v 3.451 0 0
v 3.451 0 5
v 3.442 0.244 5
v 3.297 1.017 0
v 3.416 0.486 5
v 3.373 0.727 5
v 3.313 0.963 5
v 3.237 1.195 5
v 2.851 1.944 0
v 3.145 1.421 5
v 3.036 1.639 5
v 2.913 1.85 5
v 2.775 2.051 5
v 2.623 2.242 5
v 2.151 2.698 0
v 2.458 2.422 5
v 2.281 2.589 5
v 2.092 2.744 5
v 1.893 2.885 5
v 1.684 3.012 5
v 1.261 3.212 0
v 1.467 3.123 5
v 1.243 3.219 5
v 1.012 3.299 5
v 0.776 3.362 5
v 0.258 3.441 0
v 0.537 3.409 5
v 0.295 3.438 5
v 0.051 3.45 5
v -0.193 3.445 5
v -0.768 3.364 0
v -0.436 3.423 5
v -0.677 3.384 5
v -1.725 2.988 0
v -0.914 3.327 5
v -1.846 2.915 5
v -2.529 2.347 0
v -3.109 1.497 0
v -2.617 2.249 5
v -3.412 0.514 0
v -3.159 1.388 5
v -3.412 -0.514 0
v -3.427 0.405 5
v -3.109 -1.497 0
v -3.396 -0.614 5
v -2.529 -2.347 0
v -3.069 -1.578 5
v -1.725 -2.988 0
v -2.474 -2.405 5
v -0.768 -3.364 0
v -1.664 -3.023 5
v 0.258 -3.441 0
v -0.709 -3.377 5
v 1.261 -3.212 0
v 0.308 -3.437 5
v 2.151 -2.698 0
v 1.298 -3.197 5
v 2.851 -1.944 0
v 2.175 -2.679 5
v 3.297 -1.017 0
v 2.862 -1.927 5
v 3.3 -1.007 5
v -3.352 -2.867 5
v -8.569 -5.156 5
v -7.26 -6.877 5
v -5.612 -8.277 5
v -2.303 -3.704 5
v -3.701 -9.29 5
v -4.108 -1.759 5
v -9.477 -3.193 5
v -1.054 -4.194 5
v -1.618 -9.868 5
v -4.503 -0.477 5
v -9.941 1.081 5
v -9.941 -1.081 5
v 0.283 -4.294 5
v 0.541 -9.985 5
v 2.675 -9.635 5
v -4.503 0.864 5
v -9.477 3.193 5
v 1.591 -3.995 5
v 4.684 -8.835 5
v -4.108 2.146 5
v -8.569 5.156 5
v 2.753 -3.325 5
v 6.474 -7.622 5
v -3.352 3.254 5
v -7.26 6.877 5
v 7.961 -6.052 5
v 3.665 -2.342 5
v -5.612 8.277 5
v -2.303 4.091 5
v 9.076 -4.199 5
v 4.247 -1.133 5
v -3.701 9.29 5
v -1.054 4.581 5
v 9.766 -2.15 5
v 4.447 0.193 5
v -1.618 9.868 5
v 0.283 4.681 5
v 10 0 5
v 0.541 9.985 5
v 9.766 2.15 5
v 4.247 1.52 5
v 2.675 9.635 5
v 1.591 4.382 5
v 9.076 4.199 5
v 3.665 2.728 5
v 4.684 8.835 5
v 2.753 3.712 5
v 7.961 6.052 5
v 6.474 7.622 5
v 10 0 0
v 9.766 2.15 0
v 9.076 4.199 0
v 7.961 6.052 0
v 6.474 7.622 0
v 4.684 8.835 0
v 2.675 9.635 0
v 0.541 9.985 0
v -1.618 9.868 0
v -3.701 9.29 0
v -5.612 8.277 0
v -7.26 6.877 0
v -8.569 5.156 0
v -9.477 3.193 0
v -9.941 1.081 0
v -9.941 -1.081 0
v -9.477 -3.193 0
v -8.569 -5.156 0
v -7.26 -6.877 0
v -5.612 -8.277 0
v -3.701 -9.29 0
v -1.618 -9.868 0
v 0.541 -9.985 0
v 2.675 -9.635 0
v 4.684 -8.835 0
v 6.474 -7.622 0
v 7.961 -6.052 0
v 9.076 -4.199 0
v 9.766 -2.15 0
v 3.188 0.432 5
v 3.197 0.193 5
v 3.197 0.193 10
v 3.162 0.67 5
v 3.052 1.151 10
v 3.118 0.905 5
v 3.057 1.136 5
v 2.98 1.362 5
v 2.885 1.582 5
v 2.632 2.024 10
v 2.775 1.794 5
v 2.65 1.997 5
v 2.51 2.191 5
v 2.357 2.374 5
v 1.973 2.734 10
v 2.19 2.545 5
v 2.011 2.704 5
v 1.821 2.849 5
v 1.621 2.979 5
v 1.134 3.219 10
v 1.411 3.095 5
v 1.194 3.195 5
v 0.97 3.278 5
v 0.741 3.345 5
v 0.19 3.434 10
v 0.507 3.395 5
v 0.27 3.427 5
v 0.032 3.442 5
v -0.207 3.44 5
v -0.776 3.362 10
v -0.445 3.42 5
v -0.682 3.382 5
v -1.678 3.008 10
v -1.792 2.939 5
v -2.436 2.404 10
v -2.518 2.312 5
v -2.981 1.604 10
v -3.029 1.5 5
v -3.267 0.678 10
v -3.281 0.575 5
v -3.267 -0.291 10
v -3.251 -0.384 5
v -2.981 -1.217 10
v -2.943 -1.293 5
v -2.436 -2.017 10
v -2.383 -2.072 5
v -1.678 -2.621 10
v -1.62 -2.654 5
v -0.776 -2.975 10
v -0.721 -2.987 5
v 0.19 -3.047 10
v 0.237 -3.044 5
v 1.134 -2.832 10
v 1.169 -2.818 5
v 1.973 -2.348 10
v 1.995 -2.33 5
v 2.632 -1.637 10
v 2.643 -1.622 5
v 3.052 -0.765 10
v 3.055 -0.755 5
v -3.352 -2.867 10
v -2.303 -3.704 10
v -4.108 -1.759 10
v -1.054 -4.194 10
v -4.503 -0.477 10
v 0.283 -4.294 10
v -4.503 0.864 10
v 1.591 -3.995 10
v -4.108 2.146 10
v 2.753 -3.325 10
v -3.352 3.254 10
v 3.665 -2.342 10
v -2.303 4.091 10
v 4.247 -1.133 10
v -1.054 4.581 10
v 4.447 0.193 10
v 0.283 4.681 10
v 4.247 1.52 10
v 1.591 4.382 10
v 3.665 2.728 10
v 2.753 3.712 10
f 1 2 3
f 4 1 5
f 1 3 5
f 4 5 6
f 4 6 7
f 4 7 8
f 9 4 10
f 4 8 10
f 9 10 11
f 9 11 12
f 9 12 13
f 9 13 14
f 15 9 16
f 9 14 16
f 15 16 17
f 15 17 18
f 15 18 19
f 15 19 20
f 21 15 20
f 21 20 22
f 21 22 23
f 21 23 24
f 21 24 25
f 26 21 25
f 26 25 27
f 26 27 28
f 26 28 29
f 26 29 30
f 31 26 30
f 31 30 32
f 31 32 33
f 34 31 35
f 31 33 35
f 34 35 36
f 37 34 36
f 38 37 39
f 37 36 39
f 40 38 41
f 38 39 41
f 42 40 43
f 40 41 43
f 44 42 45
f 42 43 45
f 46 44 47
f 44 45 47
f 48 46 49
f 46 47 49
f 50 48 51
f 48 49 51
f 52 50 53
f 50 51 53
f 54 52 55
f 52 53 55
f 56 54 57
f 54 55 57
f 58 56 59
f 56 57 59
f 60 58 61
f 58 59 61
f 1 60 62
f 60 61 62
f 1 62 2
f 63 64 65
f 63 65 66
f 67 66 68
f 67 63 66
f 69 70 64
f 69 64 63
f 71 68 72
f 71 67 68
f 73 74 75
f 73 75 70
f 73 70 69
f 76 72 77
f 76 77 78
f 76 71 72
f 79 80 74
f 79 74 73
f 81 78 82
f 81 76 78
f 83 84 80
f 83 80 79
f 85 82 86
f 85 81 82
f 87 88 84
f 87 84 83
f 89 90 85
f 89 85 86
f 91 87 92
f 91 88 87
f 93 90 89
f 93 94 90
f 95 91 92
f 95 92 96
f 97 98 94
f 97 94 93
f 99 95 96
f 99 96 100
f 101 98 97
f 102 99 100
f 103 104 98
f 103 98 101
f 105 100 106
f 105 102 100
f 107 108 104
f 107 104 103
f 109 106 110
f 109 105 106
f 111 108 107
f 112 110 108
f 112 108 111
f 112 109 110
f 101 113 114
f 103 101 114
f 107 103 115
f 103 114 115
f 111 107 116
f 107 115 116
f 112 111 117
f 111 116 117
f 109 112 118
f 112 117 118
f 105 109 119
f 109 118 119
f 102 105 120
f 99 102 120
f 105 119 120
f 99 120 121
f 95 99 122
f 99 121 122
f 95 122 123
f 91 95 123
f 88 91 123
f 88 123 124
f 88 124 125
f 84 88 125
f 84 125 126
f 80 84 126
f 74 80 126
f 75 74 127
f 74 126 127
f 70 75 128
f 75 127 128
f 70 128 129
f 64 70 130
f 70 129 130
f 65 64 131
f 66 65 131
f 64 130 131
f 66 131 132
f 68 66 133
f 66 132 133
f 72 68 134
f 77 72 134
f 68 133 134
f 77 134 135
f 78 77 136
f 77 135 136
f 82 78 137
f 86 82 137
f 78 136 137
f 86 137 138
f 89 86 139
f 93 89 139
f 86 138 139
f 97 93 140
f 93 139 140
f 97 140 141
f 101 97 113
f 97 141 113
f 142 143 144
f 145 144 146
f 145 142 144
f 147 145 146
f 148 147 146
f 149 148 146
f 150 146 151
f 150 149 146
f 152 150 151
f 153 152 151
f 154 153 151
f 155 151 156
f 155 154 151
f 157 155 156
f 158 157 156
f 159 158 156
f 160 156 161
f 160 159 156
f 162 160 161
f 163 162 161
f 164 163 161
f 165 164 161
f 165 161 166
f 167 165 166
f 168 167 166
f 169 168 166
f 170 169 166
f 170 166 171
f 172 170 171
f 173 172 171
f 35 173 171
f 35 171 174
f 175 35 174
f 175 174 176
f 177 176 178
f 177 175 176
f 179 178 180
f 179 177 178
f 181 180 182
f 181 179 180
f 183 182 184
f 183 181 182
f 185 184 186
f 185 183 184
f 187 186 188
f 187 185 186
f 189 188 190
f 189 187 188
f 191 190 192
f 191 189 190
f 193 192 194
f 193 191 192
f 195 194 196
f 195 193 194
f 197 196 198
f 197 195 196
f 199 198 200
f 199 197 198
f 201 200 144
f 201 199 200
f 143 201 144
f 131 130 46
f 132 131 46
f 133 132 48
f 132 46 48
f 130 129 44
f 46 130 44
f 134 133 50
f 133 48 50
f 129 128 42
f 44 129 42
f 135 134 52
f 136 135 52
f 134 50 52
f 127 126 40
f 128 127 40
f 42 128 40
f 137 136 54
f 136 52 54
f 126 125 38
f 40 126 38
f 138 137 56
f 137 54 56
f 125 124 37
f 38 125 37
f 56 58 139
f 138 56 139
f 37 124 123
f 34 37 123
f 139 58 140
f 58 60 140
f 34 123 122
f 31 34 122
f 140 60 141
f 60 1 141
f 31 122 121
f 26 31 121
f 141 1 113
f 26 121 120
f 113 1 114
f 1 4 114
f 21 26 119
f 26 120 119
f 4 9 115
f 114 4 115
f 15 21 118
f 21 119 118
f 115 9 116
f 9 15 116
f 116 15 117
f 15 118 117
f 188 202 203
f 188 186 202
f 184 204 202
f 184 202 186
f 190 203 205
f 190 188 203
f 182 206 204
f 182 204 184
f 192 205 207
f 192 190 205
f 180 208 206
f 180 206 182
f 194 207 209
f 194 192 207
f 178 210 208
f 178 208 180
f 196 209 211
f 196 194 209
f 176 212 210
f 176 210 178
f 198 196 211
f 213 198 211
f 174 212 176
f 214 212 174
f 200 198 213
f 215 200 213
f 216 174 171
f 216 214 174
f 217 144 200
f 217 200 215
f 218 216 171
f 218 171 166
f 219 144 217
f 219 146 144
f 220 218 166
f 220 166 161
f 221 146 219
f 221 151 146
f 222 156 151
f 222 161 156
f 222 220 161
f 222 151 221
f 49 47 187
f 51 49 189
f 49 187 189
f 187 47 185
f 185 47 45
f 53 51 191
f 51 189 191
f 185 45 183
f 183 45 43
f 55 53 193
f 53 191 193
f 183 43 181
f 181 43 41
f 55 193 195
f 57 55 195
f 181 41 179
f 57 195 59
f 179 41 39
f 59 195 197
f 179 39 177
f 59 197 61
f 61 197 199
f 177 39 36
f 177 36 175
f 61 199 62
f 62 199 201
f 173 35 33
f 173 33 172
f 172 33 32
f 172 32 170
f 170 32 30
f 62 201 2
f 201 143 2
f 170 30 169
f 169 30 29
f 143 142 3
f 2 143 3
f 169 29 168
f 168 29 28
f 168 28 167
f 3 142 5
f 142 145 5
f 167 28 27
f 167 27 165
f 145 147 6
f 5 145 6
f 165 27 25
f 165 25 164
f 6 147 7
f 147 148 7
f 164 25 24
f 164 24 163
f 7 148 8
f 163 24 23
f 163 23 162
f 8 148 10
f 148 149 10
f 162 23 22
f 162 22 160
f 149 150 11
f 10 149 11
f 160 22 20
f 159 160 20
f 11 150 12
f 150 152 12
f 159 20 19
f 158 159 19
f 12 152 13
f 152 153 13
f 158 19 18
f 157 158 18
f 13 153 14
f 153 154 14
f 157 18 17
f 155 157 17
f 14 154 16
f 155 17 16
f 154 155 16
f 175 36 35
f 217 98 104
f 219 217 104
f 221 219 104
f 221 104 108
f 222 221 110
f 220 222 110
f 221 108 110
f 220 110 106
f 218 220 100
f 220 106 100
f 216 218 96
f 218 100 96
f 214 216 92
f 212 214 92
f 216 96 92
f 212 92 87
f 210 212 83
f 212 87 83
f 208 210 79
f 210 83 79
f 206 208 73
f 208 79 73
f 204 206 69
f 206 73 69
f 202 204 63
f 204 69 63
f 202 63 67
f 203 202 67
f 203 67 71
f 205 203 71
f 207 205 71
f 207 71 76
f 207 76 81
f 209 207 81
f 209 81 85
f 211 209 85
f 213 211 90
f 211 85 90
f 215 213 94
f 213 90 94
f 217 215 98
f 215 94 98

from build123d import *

# Parameters (mm, degrees)
SKETCH1_R           = 10
BOSS_EXTRUDE2_DEPTH = 5
SKETCH2_R           = 4.5
SKETCH2_R_2         = 3.25
BOSS_EXTRUDE3_DEPTH = 5
SKETCH3_R           = 3.450600028
CUT_EXTRUDE1_DEPTH  = 5


with BuildPart() as part:
    # Sketch1 → Boss-Extrude2 (new body)
    with BuildSketch(Plane.XY):
        Circle(SKETCH1_R)
    extrude(amount=BOSS_EXTRUDE2_DEPTH)

    # Sketch2 → Boss-Extrude3 (add)
    with BuildSketch(Plane.XY.offset(5)):
        with Locations((-0.053141413, 0.193433093)):
            Circle(SKETCH2_R)
        with Locations((-0.053141413, 0.193433093)):
            Circle(SKETCH2_R_2, mode=Mode.SUBTRACT)
    extrude(amount=BOSS_EXTRUDE3_DEPTH)

    # Sketch3 → Cut-Extrude1 (cut)
    with BuildSketch(Plane.XY.offset(5)):
        Circle(SKETCH3_R)
    extrude(amount=-CUT_EXTRUDE1_DEPTH, mode=Mode.SUBTRACT)


solid = part.part
